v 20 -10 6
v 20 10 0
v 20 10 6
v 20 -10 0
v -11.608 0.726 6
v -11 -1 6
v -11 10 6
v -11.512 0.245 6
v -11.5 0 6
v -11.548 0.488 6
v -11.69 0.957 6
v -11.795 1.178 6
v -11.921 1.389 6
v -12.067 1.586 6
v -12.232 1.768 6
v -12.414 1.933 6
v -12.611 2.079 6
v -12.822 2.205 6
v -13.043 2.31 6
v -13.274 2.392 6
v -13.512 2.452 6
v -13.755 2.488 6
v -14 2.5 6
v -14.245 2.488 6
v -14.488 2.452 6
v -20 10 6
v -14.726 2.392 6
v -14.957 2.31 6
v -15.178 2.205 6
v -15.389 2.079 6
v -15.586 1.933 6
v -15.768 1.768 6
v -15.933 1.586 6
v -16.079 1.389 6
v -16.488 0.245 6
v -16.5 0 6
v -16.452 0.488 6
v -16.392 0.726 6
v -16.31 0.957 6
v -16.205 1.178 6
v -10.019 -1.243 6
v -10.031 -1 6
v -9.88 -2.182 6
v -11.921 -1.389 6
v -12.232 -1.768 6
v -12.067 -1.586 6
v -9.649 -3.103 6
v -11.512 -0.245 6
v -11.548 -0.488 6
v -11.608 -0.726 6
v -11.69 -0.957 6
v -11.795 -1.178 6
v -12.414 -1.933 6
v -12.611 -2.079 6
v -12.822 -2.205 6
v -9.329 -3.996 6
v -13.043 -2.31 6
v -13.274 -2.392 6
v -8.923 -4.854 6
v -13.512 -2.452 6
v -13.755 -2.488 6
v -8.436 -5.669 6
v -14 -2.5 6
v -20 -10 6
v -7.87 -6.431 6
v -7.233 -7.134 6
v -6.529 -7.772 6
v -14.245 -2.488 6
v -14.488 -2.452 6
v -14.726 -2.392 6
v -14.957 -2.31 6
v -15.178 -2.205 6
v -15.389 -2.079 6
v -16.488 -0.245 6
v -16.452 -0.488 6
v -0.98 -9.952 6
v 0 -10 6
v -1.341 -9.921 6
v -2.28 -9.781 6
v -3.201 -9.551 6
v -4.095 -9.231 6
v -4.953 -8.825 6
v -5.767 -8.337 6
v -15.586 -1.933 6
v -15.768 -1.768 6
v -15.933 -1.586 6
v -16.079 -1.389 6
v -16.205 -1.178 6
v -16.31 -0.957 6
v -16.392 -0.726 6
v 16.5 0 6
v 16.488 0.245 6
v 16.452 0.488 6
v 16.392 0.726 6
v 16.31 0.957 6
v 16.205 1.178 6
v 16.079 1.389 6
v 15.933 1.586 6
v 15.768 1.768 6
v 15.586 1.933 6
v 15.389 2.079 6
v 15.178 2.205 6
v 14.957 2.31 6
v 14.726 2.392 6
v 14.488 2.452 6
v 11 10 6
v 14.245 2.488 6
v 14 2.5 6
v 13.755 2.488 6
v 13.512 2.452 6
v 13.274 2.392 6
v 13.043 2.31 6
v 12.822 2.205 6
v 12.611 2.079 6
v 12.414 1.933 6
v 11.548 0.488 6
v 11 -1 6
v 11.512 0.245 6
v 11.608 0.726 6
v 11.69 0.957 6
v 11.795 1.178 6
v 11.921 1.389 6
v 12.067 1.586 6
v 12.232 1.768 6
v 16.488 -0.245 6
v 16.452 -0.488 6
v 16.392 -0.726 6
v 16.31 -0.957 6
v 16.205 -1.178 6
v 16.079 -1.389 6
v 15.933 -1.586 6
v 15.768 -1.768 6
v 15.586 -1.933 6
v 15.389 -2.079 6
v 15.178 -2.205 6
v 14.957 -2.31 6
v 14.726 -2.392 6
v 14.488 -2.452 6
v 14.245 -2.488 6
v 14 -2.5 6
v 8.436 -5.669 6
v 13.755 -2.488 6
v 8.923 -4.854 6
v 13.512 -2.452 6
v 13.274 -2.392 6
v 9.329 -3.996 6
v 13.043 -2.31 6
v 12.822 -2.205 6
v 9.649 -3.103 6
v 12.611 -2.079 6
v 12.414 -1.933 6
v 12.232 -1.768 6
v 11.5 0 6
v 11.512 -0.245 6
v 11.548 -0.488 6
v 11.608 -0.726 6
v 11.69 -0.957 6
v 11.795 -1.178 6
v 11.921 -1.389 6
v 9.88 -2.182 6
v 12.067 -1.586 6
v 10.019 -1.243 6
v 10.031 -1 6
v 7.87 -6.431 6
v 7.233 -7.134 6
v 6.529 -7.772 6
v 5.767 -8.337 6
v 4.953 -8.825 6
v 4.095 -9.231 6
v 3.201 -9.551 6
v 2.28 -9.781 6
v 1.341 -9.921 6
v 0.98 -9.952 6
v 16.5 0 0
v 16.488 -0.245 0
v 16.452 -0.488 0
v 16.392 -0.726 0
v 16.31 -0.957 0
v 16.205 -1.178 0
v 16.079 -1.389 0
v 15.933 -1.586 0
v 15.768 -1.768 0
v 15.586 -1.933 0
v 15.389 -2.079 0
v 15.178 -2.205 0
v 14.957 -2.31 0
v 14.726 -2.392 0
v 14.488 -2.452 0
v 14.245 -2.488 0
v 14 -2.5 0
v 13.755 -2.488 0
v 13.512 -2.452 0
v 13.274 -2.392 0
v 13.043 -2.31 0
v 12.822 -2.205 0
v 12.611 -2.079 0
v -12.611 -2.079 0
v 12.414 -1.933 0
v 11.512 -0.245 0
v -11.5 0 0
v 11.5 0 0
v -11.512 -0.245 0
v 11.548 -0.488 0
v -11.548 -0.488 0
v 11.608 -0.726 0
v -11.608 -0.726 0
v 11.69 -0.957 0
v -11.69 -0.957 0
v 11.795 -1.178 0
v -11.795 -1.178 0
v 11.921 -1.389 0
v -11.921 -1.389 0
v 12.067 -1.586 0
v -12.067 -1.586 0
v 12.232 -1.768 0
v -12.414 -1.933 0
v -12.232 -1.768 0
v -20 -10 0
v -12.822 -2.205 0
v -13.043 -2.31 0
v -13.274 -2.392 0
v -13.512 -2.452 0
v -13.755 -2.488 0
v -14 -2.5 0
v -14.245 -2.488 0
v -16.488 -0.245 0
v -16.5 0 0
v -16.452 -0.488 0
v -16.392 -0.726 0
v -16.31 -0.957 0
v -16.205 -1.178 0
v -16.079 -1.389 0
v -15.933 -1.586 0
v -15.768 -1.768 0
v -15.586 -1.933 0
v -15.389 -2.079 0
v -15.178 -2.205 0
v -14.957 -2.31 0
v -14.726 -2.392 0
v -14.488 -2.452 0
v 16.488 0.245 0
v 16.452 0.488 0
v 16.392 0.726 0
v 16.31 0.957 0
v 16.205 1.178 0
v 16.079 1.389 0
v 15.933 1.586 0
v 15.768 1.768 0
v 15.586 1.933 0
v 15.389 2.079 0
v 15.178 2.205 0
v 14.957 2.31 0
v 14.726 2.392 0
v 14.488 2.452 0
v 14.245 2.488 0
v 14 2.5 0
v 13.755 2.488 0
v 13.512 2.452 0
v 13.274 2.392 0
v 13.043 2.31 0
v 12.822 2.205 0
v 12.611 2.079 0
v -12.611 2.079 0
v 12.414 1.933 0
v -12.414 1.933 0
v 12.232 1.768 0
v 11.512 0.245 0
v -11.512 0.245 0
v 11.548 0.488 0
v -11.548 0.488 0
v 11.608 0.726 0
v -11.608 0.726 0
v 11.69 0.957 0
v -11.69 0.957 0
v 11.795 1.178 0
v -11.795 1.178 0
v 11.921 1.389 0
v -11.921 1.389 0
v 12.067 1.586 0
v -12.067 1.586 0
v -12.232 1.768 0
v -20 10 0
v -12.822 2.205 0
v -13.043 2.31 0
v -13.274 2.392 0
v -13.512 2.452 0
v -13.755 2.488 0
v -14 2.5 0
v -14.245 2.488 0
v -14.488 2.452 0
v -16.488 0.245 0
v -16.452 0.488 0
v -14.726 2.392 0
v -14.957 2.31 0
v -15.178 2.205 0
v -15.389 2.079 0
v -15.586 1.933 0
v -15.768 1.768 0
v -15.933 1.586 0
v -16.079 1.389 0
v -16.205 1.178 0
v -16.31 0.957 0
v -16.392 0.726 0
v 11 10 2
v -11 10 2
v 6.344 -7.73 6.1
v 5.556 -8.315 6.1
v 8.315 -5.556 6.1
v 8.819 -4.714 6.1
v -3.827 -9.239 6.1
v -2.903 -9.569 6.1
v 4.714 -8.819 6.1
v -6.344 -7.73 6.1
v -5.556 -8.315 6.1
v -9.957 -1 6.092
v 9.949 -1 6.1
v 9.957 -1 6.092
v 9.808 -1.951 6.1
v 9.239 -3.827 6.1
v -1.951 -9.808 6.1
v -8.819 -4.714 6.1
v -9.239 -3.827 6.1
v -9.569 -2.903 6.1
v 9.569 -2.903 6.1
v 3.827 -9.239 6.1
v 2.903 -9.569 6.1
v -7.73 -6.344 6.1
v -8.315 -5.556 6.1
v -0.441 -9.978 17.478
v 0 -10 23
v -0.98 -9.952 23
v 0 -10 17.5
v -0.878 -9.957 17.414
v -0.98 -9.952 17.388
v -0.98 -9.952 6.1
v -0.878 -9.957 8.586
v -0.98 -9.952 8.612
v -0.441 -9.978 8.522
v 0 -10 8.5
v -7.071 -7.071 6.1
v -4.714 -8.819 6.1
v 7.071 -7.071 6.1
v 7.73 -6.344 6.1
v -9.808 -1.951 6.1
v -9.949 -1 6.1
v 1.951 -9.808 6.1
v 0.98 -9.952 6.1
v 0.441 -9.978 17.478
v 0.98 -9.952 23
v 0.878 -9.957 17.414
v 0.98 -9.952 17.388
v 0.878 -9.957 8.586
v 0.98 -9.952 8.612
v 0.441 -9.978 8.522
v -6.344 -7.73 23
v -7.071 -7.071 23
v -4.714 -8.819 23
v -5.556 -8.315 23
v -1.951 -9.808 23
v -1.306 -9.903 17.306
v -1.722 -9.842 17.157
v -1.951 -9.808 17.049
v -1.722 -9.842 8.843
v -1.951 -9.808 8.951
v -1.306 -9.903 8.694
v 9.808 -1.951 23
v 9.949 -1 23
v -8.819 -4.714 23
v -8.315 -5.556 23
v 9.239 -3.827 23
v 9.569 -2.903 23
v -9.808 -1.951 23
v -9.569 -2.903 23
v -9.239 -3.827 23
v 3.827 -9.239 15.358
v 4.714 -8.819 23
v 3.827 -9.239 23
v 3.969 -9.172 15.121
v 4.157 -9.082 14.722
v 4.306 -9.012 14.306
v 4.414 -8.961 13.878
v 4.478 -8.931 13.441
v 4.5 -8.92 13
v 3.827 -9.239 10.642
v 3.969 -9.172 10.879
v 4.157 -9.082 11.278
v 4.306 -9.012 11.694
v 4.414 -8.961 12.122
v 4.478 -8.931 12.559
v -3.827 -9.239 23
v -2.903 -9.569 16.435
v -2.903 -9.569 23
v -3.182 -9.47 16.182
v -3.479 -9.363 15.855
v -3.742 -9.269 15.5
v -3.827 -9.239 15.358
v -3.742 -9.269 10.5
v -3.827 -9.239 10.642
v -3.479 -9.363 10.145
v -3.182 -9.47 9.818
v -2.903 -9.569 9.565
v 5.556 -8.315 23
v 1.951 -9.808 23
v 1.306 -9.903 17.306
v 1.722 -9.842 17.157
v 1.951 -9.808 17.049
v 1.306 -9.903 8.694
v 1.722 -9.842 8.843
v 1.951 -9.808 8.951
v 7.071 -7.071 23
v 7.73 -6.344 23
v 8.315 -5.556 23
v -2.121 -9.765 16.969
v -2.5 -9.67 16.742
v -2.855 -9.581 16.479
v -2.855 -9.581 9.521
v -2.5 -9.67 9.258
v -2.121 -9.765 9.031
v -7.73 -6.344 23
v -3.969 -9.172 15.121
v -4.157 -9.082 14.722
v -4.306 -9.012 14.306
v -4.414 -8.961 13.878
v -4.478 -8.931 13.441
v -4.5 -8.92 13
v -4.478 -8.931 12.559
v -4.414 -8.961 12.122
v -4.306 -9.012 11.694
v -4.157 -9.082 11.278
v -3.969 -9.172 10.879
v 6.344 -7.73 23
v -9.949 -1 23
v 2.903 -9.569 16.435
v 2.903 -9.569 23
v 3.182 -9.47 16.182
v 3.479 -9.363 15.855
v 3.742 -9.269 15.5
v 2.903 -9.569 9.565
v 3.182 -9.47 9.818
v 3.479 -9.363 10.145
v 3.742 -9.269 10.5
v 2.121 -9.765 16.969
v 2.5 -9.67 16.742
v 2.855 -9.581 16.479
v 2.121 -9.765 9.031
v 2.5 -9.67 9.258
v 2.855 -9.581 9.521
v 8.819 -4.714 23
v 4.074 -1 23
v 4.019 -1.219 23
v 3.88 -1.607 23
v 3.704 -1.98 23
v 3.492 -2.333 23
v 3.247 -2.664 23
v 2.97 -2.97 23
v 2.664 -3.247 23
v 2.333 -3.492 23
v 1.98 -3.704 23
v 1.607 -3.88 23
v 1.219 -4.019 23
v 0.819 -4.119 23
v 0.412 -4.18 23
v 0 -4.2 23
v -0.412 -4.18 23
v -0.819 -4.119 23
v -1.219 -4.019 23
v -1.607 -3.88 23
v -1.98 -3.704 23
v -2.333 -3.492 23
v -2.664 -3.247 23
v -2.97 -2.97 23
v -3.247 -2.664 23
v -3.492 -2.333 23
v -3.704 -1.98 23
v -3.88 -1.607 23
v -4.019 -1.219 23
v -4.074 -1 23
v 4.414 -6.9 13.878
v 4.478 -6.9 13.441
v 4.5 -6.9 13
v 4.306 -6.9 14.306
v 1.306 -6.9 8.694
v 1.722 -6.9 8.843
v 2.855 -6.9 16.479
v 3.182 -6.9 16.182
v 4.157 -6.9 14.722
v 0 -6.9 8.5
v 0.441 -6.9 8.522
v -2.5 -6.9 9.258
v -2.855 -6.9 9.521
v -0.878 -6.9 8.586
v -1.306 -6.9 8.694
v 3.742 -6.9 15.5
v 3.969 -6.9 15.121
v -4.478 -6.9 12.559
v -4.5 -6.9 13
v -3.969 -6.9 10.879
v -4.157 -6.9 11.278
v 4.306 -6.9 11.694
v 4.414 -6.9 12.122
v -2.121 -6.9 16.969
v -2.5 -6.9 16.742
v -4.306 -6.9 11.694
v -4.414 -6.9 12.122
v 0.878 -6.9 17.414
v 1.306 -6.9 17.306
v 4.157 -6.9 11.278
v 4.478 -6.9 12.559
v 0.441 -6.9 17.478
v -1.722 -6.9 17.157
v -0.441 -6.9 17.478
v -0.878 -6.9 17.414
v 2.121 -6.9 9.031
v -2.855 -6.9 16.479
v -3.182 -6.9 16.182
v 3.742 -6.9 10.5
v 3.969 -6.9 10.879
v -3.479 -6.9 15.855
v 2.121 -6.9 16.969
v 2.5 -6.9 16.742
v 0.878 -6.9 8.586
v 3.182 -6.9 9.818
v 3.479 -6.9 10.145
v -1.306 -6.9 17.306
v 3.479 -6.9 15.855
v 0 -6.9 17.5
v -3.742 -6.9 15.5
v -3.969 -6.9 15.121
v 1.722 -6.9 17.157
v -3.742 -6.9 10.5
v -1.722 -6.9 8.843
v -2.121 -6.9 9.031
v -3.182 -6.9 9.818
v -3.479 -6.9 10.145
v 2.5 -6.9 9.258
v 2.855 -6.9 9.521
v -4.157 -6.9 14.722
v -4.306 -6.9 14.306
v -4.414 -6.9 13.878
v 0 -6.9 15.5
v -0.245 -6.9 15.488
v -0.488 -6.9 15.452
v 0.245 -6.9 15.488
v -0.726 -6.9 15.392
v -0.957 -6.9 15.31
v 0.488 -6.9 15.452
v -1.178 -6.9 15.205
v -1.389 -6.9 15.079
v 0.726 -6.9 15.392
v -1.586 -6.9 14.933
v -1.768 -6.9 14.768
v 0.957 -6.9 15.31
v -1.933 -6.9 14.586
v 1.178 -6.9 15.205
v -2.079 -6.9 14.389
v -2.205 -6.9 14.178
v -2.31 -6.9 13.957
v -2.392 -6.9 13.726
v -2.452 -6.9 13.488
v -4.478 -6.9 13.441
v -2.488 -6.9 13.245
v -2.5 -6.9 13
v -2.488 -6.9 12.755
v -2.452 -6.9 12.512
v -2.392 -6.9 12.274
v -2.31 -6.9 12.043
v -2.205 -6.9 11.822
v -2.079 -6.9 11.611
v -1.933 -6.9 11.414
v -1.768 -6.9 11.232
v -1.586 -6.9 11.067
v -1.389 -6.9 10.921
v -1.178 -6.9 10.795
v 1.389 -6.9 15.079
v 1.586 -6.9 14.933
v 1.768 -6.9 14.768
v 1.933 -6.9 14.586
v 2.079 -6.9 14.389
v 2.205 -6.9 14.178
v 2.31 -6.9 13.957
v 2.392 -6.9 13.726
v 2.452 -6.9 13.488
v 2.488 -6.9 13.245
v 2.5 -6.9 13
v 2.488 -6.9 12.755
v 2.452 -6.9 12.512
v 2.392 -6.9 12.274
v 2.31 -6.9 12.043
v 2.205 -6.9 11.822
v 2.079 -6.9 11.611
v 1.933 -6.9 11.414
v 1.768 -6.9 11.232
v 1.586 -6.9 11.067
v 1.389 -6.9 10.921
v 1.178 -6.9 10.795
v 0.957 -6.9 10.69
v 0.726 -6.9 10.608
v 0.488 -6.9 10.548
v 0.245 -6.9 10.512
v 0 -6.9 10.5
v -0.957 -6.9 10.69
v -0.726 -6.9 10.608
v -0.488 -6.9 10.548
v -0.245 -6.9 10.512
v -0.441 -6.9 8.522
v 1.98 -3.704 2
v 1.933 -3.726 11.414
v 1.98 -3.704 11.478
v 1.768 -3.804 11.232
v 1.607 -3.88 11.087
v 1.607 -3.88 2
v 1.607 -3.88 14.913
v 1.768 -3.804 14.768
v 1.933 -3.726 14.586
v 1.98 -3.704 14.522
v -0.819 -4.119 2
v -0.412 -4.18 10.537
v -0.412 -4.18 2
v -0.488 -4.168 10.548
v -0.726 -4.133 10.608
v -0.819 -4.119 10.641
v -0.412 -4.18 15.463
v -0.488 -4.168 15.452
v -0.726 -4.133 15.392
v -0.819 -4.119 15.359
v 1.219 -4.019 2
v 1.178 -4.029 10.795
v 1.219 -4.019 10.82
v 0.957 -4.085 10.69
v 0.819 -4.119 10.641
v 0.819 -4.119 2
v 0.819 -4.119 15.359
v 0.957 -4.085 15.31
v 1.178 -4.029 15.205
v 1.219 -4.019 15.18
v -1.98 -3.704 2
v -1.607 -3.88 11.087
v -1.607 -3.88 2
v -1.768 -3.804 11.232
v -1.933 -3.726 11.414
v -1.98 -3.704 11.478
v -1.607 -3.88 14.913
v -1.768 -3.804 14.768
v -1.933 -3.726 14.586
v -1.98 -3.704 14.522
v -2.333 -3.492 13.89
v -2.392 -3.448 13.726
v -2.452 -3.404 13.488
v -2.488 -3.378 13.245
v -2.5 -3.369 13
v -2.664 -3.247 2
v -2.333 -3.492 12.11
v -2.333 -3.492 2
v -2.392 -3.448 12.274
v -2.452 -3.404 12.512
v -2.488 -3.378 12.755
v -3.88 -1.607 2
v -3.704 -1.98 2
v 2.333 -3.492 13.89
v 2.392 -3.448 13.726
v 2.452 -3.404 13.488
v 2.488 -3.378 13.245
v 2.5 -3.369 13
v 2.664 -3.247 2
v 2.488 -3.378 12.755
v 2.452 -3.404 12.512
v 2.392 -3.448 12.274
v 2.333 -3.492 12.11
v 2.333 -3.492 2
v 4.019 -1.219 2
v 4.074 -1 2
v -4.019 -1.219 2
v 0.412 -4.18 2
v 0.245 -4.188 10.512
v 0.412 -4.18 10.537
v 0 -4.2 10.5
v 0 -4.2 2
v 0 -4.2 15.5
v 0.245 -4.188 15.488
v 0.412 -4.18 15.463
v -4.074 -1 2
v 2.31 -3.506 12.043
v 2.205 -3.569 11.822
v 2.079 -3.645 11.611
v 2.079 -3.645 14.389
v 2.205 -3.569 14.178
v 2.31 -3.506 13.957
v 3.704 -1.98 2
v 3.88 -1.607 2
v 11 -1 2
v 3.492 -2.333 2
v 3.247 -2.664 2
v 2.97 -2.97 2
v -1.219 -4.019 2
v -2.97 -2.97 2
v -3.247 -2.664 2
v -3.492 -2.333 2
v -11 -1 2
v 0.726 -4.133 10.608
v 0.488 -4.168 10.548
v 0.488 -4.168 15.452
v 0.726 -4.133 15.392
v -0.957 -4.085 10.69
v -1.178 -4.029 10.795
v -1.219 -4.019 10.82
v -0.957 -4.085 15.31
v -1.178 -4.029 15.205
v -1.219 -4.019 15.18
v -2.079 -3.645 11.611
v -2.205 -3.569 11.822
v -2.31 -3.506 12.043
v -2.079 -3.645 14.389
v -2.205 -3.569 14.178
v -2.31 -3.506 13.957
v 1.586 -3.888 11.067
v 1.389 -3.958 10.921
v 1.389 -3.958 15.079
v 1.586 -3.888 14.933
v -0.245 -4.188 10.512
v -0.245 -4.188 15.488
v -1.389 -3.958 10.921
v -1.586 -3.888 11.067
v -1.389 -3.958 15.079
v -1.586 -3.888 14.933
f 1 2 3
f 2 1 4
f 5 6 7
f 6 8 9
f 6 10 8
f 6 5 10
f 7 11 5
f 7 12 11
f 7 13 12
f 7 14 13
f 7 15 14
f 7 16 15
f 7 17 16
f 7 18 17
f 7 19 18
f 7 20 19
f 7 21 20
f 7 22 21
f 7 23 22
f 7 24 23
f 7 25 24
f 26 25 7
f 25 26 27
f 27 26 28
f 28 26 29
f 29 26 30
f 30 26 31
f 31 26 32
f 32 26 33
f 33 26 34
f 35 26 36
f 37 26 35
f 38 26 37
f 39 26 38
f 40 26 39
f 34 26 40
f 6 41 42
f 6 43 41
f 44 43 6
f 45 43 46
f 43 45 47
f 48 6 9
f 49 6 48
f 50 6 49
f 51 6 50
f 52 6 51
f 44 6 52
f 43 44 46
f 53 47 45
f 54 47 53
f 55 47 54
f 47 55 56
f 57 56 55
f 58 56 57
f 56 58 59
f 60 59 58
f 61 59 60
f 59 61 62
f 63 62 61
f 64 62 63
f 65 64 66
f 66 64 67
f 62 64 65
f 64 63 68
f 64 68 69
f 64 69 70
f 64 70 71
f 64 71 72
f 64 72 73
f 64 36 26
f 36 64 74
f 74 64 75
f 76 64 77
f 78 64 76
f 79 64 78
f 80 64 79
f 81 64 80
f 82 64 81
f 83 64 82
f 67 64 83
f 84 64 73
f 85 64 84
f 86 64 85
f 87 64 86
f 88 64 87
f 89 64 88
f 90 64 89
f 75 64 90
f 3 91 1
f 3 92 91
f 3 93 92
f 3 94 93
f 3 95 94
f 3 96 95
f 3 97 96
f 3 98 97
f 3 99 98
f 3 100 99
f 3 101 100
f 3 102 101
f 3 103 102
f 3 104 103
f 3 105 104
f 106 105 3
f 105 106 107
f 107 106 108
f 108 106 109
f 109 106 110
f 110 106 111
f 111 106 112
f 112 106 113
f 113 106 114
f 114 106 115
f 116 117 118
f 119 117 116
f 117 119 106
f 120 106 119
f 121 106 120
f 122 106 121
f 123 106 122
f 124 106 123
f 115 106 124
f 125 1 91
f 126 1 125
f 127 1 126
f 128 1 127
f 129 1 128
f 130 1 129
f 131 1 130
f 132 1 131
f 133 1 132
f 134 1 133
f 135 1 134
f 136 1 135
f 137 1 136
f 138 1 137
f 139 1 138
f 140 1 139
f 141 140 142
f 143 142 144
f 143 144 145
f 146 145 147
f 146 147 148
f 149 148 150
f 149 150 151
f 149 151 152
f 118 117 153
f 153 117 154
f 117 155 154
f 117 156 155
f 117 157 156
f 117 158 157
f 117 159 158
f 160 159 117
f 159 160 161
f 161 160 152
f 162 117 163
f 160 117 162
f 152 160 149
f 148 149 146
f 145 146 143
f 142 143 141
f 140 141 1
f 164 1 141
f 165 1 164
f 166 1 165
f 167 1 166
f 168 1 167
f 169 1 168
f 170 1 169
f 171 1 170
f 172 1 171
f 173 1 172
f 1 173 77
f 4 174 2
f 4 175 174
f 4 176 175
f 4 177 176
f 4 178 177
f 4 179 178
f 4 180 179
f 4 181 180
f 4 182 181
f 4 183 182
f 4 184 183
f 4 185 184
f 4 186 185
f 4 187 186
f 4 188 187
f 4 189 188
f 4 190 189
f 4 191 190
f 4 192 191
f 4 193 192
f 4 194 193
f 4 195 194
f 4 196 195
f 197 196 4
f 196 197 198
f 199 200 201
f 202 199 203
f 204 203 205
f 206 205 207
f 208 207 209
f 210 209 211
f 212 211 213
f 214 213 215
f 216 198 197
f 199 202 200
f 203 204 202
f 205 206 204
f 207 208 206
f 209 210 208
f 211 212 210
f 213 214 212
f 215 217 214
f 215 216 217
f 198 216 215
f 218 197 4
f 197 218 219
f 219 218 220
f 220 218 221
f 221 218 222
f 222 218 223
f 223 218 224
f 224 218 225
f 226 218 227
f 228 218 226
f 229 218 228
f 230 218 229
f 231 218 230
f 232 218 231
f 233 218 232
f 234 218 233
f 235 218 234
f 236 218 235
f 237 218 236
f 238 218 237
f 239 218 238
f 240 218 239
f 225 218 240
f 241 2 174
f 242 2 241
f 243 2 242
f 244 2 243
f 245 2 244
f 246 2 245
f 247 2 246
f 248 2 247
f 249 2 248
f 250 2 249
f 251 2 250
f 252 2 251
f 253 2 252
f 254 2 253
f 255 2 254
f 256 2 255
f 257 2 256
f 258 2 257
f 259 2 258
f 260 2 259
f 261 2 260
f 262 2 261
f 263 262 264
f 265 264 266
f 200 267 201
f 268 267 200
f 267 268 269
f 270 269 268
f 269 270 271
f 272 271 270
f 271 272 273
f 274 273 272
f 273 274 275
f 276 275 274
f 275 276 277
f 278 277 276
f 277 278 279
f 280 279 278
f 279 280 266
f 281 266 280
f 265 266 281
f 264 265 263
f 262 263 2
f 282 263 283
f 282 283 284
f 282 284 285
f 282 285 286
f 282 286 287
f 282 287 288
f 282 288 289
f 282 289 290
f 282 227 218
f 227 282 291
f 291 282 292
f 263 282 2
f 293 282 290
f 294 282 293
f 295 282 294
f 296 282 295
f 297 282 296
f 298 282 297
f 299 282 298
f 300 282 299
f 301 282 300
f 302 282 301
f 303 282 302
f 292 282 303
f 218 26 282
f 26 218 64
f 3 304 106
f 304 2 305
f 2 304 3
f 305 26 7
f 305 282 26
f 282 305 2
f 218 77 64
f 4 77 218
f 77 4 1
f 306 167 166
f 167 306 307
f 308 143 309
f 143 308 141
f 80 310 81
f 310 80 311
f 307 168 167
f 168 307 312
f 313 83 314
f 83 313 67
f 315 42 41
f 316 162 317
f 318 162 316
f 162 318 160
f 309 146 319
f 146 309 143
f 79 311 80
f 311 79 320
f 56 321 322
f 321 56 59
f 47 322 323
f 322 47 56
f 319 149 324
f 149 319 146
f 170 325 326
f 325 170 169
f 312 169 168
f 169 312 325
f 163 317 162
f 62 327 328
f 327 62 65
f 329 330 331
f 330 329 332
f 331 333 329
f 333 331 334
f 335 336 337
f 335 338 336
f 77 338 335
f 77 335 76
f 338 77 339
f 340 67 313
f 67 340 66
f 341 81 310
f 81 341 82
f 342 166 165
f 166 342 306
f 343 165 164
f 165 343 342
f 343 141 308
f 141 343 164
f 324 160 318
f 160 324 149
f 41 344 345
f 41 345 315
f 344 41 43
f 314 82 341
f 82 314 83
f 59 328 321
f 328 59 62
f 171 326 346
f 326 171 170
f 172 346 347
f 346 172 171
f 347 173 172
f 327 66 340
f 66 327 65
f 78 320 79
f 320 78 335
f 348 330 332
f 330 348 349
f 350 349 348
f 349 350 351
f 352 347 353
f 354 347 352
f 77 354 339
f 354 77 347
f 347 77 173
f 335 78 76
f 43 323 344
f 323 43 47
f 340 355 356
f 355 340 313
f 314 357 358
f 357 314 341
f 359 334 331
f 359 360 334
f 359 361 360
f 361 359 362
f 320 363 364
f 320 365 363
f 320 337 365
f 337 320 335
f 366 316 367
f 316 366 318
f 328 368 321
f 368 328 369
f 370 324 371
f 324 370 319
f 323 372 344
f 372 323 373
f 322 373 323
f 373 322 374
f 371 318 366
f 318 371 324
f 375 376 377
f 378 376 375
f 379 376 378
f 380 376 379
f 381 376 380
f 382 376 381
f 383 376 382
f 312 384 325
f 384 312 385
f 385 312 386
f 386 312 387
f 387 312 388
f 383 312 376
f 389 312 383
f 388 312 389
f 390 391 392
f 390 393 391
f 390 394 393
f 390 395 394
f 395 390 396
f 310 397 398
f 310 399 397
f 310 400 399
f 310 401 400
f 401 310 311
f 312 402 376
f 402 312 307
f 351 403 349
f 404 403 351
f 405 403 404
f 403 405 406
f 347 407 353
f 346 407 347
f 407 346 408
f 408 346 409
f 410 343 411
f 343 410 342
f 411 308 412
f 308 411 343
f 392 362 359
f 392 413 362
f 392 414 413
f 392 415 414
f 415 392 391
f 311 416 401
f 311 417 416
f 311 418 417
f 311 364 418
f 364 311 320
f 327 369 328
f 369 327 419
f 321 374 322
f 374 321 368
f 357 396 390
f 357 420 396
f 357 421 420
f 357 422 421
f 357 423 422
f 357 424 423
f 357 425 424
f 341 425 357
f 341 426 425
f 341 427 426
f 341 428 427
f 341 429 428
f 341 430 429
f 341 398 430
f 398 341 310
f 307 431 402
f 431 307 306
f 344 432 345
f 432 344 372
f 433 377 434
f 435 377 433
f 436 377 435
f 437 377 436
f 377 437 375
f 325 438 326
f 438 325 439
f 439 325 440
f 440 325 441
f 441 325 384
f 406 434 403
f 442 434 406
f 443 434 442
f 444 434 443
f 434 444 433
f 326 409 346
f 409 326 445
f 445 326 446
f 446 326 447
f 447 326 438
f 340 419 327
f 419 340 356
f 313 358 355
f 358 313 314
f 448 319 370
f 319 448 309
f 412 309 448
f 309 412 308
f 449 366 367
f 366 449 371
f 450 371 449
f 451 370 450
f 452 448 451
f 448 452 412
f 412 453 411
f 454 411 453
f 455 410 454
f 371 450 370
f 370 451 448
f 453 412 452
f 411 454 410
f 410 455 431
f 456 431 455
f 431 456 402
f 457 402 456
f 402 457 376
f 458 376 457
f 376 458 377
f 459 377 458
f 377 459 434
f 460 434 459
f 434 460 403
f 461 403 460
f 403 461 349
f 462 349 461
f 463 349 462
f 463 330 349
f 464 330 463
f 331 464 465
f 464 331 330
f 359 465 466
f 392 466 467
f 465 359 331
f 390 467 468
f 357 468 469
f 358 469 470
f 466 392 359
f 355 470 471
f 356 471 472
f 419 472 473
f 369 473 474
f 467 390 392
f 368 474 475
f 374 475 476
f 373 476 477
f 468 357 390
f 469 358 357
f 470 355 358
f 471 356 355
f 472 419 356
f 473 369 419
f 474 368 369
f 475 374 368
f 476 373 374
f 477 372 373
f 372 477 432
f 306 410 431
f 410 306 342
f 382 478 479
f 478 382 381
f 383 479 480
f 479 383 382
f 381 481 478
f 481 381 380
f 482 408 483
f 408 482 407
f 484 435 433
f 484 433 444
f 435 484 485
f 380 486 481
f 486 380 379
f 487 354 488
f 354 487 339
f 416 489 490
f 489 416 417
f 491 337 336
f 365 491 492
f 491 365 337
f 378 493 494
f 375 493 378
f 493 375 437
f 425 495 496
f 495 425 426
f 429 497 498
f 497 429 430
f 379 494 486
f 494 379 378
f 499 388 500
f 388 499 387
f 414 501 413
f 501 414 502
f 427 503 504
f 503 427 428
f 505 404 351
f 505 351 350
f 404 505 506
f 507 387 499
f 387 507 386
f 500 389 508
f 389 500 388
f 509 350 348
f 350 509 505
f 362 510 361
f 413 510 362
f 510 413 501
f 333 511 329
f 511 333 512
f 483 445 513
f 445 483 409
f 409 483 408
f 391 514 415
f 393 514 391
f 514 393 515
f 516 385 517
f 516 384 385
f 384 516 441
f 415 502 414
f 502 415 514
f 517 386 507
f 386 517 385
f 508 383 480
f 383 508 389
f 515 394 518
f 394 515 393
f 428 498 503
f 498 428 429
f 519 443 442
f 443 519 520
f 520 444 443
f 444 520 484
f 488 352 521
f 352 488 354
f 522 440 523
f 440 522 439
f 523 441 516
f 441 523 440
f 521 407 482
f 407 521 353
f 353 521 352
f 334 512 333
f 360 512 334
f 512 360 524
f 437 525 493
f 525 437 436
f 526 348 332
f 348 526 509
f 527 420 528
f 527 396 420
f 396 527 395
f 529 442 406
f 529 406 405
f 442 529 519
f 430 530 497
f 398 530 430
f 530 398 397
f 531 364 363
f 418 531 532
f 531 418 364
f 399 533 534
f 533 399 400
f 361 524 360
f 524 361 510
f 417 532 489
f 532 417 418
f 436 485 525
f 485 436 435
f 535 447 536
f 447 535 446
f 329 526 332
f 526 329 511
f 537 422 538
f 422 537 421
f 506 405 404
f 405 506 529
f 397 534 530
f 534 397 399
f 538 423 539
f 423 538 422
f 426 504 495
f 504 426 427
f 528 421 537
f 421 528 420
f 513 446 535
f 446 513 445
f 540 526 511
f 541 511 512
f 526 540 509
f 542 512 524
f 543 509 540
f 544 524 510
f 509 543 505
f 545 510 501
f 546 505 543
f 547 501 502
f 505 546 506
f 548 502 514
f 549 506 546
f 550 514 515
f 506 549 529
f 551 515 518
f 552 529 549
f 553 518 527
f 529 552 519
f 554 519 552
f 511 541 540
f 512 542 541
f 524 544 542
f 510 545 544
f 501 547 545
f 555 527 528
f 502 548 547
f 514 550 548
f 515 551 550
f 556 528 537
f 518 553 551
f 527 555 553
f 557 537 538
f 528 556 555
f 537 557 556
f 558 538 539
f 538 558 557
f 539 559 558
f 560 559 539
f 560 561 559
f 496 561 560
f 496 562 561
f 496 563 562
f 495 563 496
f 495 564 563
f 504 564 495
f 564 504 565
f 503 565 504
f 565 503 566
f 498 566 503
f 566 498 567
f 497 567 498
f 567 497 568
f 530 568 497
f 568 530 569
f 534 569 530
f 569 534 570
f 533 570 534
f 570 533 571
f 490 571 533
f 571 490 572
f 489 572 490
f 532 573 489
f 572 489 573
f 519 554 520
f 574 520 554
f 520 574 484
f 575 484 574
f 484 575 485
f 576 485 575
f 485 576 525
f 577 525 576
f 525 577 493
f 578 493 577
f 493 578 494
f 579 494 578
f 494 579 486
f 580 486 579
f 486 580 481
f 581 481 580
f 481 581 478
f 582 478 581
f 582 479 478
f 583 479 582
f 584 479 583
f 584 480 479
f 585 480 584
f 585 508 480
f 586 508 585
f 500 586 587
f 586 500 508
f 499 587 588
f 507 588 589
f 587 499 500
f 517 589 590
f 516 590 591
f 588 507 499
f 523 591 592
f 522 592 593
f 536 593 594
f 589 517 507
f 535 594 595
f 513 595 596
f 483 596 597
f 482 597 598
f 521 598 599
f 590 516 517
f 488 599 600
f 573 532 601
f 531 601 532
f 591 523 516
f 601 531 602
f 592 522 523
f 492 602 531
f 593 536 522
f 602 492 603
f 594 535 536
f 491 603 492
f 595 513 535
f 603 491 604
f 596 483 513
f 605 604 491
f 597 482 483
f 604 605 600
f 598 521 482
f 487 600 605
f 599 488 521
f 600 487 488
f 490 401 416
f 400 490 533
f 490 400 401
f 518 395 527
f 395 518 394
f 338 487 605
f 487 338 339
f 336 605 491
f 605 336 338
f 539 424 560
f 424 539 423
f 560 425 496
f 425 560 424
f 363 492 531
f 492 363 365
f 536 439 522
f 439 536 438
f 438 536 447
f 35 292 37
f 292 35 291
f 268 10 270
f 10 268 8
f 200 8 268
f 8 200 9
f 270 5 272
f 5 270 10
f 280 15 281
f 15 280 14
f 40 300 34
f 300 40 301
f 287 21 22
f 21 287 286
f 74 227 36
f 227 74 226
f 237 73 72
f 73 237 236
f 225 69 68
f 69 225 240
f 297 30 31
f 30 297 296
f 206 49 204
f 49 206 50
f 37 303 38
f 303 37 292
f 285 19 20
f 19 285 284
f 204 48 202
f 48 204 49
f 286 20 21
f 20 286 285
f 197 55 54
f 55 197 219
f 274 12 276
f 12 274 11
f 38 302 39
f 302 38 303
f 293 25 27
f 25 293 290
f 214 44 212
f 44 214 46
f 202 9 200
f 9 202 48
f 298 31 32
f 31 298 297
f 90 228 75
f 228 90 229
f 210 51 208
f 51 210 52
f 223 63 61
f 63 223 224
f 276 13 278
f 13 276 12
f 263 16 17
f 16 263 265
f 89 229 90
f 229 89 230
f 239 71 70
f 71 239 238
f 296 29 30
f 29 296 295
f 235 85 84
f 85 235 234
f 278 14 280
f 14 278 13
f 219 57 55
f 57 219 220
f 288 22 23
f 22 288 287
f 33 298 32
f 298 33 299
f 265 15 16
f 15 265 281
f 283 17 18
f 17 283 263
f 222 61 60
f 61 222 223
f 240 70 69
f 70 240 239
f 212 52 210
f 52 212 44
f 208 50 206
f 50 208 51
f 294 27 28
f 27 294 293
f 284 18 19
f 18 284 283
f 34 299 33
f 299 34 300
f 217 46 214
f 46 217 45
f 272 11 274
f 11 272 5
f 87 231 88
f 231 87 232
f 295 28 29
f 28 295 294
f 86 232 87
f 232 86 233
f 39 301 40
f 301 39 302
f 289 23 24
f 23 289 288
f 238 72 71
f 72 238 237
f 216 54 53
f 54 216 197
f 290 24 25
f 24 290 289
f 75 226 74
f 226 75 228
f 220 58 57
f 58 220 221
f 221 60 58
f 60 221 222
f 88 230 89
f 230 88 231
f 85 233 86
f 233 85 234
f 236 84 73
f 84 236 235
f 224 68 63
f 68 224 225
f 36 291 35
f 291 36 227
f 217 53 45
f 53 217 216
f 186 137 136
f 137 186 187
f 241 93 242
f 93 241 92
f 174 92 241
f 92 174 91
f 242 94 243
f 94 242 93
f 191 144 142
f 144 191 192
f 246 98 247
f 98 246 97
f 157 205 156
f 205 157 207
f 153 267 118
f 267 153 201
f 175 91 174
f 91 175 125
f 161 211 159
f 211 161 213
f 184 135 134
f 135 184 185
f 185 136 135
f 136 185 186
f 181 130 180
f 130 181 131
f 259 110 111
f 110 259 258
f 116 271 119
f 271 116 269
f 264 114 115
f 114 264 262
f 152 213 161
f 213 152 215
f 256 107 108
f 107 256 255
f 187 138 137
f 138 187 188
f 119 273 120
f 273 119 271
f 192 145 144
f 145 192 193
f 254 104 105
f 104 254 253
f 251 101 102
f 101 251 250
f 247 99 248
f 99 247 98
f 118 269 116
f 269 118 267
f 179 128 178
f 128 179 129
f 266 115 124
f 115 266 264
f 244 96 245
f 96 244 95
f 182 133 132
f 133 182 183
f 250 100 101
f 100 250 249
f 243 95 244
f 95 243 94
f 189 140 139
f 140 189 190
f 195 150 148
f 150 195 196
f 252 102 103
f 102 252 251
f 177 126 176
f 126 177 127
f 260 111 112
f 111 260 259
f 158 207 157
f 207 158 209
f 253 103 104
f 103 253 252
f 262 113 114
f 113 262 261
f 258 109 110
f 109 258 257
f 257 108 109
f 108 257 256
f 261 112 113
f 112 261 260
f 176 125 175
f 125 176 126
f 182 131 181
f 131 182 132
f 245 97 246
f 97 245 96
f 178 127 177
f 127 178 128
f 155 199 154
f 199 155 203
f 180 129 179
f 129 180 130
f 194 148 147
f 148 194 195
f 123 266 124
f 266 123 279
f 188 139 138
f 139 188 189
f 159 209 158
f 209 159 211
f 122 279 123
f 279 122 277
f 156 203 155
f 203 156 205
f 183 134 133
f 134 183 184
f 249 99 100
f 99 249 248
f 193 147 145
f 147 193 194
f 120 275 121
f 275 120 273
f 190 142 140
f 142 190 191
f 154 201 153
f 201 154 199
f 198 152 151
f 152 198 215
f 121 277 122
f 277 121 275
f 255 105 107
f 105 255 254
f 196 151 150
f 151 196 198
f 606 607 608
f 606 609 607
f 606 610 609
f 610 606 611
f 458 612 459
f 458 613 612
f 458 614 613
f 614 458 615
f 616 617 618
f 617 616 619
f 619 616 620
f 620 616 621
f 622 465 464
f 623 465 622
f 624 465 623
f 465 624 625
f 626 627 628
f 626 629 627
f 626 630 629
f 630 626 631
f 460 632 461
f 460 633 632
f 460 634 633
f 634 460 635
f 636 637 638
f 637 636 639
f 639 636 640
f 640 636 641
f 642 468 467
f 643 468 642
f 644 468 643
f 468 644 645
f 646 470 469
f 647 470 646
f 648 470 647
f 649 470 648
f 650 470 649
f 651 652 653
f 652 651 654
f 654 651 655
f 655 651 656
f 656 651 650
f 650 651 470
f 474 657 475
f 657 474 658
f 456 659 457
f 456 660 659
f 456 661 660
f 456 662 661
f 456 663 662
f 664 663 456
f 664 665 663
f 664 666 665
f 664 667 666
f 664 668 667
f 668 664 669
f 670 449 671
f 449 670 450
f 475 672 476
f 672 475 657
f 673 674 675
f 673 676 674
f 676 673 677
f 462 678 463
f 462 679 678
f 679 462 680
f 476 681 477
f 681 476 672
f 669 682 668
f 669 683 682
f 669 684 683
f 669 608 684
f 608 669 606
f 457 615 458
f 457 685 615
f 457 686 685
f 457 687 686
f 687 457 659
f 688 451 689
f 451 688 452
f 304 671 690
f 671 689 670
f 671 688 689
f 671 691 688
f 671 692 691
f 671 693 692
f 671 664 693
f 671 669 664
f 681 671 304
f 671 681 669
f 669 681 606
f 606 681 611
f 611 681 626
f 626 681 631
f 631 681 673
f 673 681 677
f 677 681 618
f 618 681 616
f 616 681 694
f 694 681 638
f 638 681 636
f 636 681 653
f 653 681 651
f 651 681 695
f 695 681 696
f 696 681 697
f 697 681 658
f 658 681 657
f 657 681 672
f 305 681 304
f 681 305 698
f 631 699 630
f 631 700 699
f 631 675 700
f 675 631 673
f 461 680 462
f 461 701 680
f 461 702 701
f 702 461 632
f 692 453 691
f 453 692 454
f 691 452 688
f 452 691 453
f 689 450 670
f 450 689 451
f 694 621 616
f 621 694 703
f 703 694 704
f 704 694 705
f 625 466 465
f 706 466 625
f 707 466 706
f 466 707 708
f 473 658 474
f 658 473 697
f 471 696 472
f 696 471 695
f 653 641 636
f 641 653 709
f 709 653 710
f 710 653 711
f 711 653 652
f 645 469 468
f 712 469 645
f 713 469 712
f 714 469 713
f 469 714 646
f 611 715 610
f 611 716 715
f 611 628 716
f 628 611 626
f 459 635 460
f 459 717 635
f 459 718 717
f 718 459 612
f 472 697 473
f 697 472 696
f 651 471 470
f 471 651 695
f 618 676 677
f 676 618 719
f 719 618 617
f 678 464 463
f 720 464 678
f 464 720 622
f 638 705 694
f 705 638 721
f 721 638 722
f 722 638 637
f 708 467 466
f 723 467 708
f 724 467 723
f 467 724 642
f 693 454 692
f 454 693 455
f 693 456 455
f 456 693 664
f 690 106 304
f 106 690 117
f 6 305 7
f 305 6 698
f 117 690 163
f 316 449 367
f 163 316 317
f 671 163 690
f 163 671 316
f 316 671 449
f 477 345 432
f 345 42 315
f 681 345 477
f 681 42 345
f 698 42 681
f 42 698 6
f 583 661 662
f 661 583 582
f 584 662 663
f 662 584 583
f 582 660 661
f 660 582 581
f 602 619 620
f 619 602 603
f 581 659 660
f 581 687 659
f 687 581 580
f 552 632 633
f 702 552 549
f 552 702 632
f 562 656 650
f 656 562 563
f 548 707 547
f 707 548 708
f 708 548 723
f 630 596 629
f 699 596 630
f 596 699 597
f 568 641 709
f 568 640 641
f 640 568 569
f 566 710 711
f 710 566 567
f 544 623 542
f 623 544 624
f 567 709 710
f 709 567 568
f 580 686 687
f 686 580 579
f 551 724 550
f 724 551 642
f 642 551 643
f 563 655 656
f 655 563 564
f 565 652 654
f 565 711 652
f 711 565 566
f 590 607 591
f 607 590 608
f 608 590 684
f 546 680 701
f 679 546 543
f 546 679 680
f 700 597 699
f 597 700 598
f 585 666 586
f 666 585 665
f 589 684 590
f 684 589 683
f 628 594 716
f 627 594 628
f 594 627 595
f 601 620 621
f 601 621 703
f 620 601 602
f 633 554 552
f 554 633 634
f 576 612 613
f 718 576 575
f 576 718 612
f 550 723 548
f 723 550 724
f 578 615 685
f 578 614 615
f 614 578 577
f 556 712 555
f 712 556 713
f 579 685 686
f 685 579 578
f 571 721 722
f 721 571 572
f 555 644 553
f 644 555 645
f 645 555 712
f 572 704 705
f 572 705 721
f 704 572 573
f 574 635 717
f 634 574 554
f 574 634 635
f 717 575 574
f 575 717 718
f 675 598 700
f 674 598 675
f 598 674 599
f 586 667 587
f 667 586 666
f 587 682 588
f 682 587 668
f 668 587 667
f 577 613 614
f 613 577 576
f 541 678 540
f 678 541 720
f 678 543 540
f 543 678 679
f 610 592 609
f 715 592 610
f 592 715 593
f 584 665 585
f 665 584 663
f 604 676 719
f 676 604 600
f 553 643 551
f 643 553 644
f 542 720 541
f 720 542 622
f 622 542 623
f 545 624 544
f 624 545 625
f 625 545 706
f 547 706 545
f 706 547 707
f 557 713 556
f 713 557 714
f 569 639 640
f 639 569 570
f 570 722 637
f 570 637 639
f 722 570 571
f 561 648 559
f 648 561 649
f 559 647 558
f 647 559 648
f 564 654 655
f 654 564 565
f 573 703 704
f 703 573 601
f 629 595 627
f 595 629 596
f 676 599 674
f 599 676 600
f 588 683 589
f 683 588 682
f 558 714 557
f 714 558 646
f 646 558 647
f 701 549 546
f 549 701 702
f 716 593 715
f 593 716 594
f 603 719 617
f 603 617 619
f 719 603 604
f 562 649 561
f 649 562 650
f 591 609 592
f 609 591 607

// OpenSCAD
$fn=64;

rod_d = 8.0;
rod_r = rod_d/2;

bracket_h = 20.0;

base_len = 40.0;
base_w   = 20.0;
base_t   = 6.0;

wall_t = 6.0;
cap_t  = 6.0;

clamp_outer_d = rod_d + 2*wall_t;   // 20mm
clamp_outer_r = clamp_outer_d/2;

clamp_center_z = base_t + (bracket_h - base_t)/2;

slot_w = 2.0;
bolt_d = 5.0;
bolt_head_d = 9.0;
bolt_head_h = 3.0;

module base_plate(){
    translate([-base_len/2, -base_w/2, 0])
        cube([base_len, base_w, base_t], center=false);
}

module clamp_body(){
    // Outer clamp cylinder
    translate([0, 0, clamp_center_z])
        cylinder(h=bracket_h, r=clamp_outer_r, center=true);
}

module rod_bore(){
    translate([0, 0, clamp_center_z])
        cylinder(h=bracket_h + 2, r=rod_r + 0.2, center=true);
}

module clamp_slot(){
    // Slot from front face through to rod bore
    translate([0, clamp_outer_r/2, clamp_center_z])
        cube([clamp_outer_d + 2, clamp_outer_r + 2, bracket_h + 2], center=true);
}

module bolt_hole(){
    // Cross-bolt through clamp (along Y)
    translate([0, 0, clamp_center_z])
        rotate([90,0,0])
            cylinder(h=clamp_outer_d + 10, r=bolt_d/2, center=true);
}

module bolt_head_recesses(){
    // Recess on both sides for bolt head/nut
    translate([0, 0, clamp_center_z])
        rotate([90,0,0]) {
            translate([0,0,(clamp_outer_d/2) - bolt_head_h/2])
                cylinder(h=bolt_head_h+0.2, r=bolt_head_d/2, center=true);
            translate([0,0,-(clamp_outer_d/2) + bolt_head_h/2])
                cylinder(h=bolt_head_h+0.2, r=bolt_head_d/2, center=true);
        }
}

module base_mount_holes(){
    // Two mounting holes in base plate
    hole_d = 5.0;
    x_off = 14.0;
    y_off = 0.0;
    for (sx=[-1,1]) {
        translate([sx*x_off, y_off, base_t/2])
            cylinder(h=base_t+2, r=hole_d/2, center=true);
    }
}

difference(){
    union(){
        base_plate();
        // Support web between base and clamp
        hull(){
            translate([0,0,base_t])
                cylinder(h=0.1, r=clamp_outer_r, center=false);
            translate([0,0,base_t/2])
                cube([base_len*0.6, base_w*0.9, 0.1], center=true);
        }
        clamp_body();
    }
    rod_bore();
    clamp_slot();
    bolt_hole();
    bolt_head_recesses();
    base_mount_holes();
}
